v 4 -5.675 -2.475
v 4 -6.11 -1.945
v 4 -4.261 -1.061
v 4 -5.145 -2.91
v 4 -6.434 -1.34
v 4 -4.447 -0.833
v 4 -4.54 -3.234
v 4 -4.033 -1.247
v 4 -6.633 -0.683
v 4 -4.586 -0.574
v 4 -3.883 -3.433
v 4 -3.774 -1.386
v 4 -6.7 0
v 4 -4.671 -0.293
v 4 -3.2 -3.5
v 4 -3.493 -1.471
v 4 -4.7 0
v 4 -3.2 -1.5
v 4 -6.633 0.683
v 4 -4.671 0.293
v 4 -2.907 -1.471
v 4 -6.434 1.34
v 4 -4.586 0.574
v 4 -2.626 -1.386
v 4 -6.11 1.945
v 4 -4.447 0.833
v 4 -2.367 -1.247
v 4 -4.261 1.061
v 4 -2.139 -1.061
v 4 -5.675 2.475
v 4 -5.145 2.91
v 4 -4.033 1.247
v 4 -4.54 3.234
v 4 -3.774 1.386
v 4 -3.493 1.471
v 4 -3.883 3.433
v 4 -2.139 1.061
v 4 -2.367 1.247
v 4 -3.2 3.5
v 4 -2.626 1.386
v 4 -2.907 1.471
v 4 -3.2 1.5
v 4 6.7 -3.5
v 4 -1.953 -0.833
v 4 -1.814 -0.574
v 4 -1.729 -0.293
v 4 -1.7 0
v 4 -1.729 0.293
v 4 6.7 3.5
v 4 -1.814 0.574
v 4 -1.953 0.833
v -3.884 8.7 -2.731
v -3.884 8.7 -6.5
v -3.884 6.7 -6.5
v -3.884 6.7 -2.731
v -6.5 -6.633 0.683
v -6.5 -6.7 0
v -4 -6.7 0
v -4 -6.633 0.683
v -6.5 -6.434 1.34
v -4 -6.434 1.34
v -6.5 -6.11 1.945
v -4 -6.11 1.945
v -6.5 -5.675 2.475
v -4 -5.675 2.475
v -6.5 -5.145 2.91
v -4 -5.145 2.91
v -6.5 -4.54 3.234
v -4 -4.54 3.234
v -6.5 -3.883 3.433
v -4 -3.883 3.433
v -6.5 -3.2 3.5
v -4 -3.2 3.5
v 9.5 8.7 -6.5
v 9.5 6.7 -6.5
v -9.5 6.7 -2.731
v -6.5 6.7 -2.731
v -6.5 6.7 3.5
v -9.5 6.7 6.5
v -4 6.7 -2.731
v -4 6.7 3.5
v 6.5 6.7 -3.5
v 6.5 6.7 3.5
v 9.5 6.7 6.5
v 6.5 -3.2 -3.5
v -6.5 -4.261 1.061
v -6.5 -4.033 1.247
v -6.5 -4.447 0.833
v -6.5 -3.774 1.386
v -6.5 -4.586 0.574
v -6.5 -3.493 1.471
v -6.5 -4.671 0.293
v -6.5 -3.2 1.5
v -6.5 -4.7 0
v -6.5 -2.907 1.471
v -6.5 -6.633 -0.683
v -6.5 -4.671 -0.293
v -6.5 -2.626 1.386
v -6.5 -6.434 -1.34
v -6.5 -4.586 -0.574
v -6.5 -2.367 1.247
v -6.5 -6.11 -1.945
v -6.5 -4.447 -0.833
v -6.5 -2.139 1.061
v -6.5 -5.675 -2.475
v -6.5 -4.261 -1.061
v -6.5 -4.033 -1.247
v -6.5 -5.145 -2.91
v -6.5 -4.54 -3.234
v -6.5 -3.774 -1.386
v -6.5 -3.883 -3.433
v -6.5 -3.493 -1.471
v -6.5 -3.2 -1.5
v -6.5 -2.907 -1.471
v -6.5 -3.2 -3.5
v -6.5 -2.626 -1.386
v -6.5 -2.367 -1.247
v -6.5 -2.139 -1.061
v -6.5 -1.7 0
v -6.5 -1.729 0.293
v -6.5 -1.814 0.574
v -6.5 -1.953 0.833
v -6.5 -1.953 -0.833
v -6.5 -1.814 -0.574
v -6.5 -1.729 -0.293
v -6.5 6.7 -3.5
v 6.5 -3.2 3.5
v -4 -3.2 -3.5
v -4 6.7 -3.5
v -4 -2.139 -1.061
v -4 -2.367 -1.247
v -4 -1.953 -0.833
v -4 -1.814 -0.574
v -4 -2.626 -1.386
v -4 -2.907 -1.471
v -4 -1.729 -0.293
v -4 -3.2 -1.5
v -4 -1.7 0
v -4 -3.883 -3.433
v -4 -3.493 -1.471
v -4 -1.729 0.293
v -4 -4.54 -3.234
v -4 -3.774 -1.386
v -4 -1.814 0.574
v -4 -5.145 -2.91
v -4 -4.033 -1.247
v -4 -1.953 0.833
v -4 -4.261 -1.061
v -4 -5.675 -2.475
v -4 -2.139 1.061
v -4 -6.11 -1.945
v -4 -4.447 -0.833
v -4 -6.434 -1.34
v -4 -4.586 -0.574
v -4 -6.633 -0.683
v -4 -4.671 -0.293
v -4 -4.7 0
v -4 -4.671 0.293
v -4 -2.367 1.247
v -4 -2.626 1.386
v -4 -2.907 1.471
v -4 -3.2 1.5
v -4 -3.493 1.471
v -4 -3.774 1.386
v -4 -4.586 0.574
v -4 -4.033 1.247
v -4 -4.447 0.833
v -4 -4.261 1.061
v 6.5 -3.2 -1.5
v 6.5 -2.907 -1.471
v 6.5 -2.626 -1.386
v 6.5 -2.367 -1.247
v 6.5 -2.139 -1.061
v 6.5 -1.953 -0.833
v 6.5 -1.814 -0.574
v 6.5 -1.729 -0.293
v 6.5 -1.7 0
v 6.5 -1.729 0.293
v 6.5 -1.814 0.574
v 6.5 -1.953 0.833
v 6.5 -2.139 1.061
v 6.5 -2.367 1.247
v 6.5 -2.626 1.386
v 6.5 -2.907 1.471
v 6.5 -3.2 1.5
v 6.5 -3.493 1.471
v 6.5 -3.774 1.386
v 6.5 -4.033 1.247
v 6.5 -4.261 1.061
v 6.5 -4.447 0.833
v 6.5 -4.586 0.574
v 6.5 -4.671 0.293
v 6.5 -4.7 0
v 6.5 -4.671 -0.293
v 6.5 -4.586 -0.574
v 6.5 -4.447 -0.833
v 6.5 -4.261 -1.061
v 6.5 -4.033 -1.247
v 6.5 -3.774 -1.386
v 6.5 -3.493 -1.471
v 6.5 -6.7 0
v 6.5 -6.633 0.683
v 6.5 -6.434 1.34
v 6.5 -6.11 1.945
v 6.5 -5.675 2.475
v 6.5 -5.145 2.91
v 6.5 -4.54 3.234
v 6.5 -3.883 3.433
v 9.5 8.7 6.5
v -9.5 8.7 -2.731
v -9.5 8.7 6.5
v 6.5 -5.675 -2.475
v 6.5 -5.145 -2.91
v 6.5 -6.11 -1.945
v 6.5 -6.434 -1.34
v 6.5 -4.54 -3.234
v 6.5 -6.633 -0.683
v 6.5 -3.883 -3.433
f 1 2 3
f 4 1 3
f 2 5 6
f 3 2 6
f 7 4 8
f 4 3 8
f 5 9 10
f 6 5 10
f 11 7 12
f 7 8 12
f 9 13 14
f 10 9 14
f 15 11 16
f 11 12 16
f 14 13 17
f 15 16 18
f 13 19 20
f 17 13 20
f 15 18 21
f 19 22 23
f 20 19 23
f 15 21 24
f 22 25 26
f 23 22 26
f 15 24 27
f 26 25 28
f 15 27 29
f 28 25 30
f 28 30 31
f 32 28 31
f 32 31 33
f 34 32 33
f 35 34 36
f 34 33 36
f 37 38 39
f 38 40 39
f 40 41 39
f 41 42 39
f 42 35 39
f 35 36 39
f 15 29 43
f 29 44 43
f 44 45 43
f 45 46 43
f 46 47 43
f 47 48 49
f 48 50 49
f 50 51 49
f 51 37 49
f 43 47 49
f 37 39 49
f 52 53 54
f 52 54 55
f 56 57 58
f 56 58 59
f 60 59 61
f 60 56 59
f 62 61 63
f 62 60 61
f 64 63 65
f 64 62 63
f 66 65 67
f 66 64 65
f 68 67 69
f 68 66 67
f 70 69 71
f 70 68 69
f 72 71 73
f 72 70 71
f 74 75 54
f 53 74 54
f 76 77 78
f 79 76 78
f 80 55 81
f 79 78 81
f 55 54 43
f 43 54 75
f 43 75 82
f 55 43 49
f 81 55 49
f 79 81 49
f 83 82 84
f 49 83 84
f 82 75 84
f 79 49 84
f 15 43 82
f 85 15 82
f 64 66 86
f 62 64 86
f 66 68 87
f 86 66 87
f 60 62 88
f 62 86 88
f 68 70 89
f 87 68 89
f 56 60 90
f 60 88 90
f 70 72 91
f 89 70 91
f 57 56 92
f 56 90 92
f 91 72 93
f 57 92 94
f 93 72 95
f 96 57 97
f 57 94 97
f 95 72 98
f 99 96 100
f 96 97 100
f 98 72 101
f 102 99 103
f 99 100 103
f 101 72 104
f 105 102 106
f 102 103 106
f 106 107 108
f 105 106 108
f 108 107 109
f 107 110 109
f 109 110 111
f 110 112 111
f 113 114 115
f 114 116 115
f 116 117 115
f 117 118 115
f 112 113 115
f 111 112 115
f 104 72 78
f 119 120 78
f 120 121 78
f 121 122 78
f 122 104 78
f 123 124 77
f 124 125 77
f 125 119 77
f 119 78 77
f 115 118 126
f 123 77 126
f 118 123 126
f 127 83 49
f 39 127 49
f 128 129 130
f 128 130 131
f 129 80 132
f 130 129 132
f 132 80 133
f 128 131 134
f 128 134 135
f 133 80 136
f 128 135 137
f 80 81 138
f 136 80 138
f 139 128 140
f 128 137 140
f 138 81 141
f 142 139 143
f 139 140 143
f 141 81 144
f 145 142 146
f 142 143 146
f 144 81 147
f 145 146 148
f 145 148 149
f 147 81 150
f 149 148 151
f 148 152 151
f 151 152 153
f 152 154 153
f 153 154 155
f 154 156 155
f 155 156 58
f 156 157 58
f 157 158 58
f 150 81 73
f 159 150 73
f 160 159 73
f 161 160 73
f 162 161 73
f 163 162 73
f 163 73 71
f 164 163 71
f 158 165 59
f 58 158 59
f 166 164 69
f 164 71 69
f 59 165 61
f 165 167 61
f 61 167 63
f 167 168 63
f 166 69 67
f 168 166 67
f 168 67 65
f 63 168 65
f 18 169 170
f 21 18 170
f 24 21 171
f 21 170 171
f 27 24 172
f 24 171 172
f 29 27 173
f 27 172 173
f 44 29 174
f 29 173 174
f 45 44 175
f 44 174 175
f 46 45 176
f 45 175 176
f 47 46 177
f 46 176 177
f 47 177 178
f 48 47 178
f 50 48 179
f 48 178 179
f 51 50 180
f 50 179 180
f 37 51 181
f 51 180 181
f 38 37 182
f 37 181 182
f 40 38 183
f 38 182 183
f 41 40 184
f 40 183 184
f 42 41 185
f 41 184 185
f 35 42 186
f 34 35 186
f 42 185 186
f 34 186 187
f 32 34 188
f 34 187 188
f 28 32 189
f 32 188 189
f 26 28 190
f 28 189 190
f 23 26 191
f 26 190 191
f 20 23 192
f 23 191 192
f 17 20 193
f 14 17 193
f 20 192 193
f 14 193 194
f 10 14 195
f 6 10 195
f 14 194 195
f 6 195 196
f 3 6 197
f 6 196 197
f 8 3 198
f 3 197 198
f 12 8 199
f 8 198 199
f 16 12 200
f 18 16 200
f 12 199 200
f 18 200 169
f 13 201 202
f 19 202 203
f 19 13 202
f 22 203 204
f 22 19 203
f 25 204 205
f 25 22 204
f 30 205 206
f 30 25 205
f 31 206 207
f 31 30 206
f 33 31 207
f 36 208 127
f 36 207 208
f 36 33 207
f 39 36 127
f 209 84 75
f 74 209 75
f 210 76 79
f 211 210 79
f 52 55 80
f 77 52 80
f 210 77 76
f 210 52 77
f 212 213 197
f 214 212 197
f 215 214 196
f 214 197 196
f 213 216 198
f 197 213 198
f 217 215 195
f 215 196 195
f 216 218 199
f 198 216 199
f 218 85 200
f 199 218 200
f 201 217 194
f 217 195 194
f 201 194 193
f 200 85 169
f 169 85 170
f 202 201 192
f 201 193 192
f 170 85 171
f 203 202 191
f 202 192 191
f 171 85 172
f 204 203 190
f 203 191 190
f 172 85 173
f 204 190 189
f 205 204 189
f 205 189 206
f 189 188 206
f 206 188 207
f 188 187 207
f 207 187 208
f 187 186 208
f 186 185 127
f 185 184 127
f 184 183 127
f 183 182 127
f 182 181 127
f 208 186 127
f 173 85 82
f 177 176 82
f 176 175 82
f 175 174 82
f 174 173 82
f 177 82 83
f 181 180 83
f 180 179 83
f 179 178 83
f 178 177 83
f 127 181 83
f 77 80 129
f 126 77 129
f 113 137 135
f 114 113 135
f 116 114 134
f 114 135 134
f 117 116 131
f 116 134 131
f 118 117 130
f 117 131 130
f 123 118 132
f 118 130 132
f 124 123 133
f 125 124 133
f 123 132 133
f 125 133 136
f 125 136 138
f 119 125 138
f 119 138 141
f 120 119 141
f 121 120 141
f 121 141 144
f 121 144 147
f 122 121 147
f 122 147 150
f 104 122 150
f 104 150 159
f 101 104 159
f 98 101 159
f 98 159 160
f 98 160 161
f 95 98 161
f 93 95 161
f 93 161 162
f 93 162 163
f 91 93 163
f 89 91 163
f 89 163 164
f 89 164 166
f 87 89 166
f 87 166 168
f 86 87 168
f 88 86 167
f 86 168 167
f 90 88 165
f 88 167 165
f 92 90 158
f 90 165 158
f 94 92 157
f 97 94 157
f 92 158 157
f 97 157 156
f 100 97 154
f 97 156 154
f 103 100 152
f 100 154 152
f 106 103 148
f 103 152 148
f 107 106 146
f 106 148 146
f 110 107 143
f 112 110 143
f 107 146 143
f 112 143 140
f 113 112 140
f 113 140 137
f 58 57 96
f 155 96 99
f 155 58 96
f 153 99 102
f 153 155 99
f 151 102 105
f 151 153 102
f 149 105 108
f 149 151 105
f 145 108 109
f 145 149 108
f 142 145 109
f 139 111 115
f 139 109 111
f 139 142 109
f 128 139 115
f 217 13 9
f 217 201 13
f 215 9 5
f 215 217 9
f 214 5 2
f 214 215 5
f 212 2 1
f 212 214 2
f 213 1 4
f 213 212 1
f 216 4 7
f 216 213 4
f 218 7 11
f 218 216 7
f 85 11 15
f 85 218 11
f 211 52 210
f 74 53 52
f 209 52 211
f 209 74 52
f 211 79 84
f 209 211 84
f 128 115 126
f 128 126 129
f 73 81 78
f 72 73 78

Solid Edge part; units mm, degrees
sketch "Sketch1" plane through (0, 0, 0) normal (0, -1, 0) x (1, 0, 0)
  line L0 (-6.5, -3.5) -> (6.5, -3.5)
  line L1 (6.5, -3.5) -> (6.5, 3.5)
  line L2 (6.5, 3.5) -> (-6.5, 3.5)
  line L3 (-6.5, 3.5) -> (-6.5, -3.5)
extrude "Protrusion1" add sketch "Sketch1" along normal mid plane 13.4
sketch "Sketch2" plane through (0, 6.7, 0) normal (0, 1, 0) x (0, 0, -1)
  line L0 (6.5, 9.5) -> (-6.5, 9.5)
  line L1 (-6.5, 9.5) -> (-6.5, -9.5)
  line L2 (-6.5, -9.5) -> (6.5, -9.5)
  line L3 (6.5, -9.5) -> (6.5, 9.5)
  dimension "D1" = 3
  dimension "D2" = 3
extrude "ExtrudedProtrusion_2" add sketch "Sketch2" along normal blind 2
sketch "Sketch3" plane through (0, 8.7, 0) normal (0, 1, 0) x (1, 0, 0)
  line L0 (-3.8842, 6.5) -> (-3.8842, 2.7306)
  line L1 (-3.8842, 2.7306) -> (-9.5, 2.7306)
  line L2 (-9.5, 2.7306) -> (-9.5, 6.5)
  line L3 (-9.5, 6.5) -> (-3.8842, 6.5)
extrude "Cutout1" cut sketch "Sketch3" against normal up to surface (2 mm away)
fillet "Round_1" radius 3.5 2 edges at (0, -6.7, 3.5) (0, -6.7, -3.5)
hole "Hole_1" at (6.5, -3.2, 0) direction (-1, 0, 0) diameter 3 end up to next
sketch "Sketch4" plane through (0, 1.75, 3.5) normal (0, 0, 1) x (1, 0, 0)
  line L0 (4, 4.95) -> (-4, 4.95)
  line L1 (-4, 4.95) -> (-4, -8.45)
  line L2 (-4, -8.45) -> (4, -8.45)
  line L3 (4, -8.45) -> (4, 4.95)
  dimension "D1" = 2.5
  dimension "D2" = 2.5
extrude "Cutout2" cut sketch "Sketch4" against normal up to surface (7 mm away)
properties material "Aluminum, 6061-T6"
